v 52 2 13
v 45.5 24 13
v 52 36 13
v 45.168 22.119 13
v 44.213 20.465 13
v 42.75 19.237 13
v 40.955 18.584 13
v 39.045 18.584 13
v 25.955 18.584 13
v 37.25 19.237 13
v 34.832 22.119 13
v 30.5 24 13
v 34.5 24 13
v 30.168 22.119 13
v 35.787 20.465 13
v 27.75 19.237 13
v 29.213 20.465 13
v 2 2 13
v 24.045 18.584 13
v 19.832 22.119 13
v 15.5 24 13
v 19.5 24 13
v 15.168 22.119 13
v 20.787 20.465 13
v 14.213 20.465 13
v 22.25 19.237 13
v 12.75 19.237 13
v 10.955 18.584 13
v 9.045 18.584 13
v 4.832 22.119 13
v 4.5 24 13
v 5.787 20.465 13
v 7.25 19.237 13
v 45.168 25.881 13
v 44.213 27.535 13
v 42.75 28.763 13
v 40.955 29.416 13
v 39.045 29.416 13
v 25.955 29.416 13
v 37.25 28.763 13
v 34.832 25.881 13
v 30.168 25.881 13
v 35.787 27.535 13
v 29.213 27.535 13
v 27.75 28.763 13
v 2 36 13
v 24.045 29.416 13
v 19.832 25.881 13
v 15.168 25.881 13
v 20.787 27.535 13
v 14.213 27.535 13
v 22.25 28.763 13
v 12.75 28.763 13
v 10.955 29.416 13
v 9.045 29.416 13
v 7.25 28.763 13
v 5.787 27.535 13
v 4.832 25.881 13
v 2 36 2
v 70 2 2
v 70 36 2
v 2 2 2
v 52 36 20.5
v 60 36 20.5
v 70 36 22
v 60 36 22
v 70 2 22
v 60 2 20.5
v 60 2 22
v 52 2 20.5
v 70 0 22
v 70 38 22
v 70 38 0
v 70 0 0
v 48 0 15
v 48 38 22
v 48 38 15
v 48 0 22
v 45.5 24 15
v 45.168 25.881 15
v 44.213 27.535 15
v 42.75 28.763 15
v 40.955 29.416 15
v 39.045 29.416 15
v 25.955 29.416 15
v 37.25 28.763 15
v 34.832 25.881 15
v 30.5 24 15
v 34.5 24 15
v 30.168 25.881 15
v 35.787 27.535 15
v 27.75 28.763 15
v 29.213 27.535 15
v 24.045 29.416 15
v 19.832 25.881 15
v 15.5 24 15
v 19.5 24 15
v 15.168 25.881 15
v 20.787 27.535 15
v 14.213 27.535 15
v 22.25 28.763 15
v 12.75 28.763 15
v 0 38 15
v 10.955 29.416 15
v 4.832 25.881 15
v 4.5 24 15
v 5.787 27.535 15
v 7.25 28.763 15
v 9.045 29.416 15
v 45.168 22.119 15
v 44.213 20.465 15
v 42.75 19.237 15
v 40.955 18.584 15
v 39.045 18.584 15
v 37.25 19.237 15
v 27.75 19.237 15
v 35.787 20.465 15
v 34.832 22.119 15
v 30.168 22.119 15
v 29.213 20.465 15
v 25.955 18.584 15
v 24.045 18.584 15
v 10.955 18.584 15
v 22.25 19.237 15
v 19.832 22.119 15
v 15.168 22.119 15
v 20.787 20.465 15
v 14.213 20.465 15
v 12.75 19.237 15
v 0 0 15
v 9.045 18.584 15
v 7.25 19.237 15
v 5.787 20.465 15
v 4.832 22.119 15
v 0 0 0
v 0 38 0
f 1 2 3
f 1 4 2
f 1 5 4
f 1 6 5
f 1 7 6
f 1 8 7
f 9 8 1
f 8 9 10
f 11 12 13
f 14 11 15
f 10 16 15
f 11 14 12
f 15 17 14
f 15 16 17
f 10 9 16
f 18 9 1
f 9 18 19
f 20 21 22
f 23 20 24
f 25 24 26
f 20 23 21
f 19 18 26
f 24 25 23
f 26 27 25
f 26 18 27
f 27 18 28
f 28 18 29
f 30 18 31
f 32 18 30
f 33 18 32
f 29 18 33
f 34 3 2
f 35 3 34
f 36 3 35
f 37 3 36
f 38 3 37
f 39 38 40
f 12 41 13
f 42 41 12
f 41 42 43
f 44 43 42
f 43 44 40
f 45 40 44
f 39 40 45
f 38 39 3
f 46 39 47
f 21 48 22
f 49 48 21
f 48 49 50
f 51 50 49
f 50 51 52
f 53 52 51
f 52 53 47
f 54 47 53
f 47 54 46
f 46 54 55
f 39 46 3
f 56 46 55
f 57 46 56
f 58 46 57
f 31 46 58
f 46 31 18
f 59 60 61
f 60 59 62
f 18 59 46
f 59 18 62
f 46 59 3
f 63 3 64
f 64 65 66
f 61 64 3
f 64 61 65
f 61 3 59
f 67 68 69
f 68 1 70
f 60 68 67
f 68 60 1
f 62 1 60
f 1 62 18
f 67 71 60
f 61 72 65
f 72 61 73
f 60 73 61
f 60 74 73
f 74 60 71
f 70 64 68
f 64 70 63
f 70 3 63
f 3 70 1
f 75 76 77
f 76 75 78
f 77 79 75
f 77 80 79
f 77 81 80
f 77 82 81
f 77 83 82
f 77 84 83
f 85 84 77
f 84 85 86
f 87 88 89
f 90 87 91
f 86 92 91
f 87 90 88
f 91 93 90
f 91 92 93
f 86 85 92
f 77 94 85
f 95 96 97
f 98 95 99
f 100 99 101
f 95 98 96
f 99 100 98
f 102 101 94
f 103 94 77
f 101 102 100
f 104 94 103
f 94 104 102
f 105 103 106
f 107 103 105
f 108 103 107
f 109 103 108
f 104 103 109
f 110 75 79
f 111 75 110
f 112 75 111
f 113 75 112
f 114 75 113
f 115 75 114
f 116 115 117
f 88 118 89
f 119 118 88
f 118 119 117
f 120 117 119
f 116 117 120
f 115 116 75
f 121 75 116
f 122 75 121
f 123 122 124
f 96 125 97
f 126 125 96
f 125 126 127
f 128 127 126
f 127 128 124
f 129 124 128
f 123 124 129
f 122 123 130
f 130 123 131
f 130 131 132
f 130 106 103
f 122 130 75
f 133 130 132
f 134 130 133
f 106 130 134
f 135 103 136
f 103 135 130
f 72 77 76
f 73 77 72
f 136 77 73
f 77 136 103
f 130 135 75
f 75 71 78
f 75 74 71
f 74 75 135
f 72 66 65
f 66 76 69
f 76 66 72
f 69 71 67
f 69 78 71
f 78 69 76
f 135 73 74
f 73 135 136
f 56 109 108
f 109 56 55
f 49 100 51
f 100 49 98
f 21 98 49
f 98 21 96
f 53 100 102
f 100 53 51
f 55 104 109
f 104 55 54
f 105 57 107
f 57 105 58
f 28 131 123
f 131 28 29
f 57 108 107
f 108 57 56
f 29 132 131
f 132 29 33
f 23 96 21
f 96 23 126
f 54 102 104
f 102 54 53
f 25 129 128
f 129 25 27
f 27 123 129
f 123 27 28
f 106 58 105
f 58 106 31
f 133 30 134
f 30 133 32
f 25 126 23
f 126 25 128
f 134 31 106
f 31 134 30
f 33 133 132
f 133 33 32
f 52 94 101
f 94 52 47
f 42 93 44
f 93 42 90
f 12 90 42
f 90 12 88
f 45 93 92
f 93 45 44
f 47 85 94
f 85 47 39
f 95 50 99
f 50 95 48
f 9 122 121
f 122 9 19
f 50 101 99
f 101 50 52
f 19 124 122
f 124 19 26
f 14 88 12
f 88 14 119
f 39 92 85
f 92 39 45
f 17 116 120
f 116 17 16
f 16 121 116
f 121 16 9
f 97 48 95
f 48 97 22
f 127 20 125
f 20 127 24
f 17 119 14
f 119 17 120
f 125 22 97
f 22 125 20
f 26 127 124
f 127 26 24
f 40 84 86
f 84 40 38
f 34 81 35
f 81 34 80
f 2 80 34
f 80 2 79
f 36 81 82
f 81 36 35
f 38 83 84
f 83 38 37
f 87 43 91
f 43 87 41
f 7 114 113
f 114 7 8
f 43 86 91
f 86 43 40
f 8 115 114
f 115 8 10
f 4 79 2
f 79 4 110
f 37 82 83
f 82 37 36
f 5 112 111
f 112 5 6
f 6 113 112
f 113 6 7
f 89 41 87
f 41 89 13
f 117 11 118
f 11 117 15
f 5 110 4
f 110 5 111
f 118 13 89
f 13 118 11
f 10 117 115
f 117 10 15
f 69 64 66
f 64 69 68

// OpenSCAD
difference(){
    cube([70, 38, 22]);
    translate([2, 2, 2]){
        union(){
            cube([66, 34, 11]);
            translate([50, 0, 0]){
                cube([18, 34, 18.5]);
            }
            translate([-2, -2, 13]){
                cube([48, 38, 10]);
            }
        }
    }
    
    translate([10, 24, 11]){
        cylinder(15, 5.5, 5.5);
    }
    translate([25, 24, 11]){
        cylinder(15, 5.5, 5.5);
    }
    translate([40, 24, 11]){
        cylinder(15, 5.5, 5.5);
    }
    translate([60, 2, 2]){
        cube([66, 34, 25]);
    }
}
